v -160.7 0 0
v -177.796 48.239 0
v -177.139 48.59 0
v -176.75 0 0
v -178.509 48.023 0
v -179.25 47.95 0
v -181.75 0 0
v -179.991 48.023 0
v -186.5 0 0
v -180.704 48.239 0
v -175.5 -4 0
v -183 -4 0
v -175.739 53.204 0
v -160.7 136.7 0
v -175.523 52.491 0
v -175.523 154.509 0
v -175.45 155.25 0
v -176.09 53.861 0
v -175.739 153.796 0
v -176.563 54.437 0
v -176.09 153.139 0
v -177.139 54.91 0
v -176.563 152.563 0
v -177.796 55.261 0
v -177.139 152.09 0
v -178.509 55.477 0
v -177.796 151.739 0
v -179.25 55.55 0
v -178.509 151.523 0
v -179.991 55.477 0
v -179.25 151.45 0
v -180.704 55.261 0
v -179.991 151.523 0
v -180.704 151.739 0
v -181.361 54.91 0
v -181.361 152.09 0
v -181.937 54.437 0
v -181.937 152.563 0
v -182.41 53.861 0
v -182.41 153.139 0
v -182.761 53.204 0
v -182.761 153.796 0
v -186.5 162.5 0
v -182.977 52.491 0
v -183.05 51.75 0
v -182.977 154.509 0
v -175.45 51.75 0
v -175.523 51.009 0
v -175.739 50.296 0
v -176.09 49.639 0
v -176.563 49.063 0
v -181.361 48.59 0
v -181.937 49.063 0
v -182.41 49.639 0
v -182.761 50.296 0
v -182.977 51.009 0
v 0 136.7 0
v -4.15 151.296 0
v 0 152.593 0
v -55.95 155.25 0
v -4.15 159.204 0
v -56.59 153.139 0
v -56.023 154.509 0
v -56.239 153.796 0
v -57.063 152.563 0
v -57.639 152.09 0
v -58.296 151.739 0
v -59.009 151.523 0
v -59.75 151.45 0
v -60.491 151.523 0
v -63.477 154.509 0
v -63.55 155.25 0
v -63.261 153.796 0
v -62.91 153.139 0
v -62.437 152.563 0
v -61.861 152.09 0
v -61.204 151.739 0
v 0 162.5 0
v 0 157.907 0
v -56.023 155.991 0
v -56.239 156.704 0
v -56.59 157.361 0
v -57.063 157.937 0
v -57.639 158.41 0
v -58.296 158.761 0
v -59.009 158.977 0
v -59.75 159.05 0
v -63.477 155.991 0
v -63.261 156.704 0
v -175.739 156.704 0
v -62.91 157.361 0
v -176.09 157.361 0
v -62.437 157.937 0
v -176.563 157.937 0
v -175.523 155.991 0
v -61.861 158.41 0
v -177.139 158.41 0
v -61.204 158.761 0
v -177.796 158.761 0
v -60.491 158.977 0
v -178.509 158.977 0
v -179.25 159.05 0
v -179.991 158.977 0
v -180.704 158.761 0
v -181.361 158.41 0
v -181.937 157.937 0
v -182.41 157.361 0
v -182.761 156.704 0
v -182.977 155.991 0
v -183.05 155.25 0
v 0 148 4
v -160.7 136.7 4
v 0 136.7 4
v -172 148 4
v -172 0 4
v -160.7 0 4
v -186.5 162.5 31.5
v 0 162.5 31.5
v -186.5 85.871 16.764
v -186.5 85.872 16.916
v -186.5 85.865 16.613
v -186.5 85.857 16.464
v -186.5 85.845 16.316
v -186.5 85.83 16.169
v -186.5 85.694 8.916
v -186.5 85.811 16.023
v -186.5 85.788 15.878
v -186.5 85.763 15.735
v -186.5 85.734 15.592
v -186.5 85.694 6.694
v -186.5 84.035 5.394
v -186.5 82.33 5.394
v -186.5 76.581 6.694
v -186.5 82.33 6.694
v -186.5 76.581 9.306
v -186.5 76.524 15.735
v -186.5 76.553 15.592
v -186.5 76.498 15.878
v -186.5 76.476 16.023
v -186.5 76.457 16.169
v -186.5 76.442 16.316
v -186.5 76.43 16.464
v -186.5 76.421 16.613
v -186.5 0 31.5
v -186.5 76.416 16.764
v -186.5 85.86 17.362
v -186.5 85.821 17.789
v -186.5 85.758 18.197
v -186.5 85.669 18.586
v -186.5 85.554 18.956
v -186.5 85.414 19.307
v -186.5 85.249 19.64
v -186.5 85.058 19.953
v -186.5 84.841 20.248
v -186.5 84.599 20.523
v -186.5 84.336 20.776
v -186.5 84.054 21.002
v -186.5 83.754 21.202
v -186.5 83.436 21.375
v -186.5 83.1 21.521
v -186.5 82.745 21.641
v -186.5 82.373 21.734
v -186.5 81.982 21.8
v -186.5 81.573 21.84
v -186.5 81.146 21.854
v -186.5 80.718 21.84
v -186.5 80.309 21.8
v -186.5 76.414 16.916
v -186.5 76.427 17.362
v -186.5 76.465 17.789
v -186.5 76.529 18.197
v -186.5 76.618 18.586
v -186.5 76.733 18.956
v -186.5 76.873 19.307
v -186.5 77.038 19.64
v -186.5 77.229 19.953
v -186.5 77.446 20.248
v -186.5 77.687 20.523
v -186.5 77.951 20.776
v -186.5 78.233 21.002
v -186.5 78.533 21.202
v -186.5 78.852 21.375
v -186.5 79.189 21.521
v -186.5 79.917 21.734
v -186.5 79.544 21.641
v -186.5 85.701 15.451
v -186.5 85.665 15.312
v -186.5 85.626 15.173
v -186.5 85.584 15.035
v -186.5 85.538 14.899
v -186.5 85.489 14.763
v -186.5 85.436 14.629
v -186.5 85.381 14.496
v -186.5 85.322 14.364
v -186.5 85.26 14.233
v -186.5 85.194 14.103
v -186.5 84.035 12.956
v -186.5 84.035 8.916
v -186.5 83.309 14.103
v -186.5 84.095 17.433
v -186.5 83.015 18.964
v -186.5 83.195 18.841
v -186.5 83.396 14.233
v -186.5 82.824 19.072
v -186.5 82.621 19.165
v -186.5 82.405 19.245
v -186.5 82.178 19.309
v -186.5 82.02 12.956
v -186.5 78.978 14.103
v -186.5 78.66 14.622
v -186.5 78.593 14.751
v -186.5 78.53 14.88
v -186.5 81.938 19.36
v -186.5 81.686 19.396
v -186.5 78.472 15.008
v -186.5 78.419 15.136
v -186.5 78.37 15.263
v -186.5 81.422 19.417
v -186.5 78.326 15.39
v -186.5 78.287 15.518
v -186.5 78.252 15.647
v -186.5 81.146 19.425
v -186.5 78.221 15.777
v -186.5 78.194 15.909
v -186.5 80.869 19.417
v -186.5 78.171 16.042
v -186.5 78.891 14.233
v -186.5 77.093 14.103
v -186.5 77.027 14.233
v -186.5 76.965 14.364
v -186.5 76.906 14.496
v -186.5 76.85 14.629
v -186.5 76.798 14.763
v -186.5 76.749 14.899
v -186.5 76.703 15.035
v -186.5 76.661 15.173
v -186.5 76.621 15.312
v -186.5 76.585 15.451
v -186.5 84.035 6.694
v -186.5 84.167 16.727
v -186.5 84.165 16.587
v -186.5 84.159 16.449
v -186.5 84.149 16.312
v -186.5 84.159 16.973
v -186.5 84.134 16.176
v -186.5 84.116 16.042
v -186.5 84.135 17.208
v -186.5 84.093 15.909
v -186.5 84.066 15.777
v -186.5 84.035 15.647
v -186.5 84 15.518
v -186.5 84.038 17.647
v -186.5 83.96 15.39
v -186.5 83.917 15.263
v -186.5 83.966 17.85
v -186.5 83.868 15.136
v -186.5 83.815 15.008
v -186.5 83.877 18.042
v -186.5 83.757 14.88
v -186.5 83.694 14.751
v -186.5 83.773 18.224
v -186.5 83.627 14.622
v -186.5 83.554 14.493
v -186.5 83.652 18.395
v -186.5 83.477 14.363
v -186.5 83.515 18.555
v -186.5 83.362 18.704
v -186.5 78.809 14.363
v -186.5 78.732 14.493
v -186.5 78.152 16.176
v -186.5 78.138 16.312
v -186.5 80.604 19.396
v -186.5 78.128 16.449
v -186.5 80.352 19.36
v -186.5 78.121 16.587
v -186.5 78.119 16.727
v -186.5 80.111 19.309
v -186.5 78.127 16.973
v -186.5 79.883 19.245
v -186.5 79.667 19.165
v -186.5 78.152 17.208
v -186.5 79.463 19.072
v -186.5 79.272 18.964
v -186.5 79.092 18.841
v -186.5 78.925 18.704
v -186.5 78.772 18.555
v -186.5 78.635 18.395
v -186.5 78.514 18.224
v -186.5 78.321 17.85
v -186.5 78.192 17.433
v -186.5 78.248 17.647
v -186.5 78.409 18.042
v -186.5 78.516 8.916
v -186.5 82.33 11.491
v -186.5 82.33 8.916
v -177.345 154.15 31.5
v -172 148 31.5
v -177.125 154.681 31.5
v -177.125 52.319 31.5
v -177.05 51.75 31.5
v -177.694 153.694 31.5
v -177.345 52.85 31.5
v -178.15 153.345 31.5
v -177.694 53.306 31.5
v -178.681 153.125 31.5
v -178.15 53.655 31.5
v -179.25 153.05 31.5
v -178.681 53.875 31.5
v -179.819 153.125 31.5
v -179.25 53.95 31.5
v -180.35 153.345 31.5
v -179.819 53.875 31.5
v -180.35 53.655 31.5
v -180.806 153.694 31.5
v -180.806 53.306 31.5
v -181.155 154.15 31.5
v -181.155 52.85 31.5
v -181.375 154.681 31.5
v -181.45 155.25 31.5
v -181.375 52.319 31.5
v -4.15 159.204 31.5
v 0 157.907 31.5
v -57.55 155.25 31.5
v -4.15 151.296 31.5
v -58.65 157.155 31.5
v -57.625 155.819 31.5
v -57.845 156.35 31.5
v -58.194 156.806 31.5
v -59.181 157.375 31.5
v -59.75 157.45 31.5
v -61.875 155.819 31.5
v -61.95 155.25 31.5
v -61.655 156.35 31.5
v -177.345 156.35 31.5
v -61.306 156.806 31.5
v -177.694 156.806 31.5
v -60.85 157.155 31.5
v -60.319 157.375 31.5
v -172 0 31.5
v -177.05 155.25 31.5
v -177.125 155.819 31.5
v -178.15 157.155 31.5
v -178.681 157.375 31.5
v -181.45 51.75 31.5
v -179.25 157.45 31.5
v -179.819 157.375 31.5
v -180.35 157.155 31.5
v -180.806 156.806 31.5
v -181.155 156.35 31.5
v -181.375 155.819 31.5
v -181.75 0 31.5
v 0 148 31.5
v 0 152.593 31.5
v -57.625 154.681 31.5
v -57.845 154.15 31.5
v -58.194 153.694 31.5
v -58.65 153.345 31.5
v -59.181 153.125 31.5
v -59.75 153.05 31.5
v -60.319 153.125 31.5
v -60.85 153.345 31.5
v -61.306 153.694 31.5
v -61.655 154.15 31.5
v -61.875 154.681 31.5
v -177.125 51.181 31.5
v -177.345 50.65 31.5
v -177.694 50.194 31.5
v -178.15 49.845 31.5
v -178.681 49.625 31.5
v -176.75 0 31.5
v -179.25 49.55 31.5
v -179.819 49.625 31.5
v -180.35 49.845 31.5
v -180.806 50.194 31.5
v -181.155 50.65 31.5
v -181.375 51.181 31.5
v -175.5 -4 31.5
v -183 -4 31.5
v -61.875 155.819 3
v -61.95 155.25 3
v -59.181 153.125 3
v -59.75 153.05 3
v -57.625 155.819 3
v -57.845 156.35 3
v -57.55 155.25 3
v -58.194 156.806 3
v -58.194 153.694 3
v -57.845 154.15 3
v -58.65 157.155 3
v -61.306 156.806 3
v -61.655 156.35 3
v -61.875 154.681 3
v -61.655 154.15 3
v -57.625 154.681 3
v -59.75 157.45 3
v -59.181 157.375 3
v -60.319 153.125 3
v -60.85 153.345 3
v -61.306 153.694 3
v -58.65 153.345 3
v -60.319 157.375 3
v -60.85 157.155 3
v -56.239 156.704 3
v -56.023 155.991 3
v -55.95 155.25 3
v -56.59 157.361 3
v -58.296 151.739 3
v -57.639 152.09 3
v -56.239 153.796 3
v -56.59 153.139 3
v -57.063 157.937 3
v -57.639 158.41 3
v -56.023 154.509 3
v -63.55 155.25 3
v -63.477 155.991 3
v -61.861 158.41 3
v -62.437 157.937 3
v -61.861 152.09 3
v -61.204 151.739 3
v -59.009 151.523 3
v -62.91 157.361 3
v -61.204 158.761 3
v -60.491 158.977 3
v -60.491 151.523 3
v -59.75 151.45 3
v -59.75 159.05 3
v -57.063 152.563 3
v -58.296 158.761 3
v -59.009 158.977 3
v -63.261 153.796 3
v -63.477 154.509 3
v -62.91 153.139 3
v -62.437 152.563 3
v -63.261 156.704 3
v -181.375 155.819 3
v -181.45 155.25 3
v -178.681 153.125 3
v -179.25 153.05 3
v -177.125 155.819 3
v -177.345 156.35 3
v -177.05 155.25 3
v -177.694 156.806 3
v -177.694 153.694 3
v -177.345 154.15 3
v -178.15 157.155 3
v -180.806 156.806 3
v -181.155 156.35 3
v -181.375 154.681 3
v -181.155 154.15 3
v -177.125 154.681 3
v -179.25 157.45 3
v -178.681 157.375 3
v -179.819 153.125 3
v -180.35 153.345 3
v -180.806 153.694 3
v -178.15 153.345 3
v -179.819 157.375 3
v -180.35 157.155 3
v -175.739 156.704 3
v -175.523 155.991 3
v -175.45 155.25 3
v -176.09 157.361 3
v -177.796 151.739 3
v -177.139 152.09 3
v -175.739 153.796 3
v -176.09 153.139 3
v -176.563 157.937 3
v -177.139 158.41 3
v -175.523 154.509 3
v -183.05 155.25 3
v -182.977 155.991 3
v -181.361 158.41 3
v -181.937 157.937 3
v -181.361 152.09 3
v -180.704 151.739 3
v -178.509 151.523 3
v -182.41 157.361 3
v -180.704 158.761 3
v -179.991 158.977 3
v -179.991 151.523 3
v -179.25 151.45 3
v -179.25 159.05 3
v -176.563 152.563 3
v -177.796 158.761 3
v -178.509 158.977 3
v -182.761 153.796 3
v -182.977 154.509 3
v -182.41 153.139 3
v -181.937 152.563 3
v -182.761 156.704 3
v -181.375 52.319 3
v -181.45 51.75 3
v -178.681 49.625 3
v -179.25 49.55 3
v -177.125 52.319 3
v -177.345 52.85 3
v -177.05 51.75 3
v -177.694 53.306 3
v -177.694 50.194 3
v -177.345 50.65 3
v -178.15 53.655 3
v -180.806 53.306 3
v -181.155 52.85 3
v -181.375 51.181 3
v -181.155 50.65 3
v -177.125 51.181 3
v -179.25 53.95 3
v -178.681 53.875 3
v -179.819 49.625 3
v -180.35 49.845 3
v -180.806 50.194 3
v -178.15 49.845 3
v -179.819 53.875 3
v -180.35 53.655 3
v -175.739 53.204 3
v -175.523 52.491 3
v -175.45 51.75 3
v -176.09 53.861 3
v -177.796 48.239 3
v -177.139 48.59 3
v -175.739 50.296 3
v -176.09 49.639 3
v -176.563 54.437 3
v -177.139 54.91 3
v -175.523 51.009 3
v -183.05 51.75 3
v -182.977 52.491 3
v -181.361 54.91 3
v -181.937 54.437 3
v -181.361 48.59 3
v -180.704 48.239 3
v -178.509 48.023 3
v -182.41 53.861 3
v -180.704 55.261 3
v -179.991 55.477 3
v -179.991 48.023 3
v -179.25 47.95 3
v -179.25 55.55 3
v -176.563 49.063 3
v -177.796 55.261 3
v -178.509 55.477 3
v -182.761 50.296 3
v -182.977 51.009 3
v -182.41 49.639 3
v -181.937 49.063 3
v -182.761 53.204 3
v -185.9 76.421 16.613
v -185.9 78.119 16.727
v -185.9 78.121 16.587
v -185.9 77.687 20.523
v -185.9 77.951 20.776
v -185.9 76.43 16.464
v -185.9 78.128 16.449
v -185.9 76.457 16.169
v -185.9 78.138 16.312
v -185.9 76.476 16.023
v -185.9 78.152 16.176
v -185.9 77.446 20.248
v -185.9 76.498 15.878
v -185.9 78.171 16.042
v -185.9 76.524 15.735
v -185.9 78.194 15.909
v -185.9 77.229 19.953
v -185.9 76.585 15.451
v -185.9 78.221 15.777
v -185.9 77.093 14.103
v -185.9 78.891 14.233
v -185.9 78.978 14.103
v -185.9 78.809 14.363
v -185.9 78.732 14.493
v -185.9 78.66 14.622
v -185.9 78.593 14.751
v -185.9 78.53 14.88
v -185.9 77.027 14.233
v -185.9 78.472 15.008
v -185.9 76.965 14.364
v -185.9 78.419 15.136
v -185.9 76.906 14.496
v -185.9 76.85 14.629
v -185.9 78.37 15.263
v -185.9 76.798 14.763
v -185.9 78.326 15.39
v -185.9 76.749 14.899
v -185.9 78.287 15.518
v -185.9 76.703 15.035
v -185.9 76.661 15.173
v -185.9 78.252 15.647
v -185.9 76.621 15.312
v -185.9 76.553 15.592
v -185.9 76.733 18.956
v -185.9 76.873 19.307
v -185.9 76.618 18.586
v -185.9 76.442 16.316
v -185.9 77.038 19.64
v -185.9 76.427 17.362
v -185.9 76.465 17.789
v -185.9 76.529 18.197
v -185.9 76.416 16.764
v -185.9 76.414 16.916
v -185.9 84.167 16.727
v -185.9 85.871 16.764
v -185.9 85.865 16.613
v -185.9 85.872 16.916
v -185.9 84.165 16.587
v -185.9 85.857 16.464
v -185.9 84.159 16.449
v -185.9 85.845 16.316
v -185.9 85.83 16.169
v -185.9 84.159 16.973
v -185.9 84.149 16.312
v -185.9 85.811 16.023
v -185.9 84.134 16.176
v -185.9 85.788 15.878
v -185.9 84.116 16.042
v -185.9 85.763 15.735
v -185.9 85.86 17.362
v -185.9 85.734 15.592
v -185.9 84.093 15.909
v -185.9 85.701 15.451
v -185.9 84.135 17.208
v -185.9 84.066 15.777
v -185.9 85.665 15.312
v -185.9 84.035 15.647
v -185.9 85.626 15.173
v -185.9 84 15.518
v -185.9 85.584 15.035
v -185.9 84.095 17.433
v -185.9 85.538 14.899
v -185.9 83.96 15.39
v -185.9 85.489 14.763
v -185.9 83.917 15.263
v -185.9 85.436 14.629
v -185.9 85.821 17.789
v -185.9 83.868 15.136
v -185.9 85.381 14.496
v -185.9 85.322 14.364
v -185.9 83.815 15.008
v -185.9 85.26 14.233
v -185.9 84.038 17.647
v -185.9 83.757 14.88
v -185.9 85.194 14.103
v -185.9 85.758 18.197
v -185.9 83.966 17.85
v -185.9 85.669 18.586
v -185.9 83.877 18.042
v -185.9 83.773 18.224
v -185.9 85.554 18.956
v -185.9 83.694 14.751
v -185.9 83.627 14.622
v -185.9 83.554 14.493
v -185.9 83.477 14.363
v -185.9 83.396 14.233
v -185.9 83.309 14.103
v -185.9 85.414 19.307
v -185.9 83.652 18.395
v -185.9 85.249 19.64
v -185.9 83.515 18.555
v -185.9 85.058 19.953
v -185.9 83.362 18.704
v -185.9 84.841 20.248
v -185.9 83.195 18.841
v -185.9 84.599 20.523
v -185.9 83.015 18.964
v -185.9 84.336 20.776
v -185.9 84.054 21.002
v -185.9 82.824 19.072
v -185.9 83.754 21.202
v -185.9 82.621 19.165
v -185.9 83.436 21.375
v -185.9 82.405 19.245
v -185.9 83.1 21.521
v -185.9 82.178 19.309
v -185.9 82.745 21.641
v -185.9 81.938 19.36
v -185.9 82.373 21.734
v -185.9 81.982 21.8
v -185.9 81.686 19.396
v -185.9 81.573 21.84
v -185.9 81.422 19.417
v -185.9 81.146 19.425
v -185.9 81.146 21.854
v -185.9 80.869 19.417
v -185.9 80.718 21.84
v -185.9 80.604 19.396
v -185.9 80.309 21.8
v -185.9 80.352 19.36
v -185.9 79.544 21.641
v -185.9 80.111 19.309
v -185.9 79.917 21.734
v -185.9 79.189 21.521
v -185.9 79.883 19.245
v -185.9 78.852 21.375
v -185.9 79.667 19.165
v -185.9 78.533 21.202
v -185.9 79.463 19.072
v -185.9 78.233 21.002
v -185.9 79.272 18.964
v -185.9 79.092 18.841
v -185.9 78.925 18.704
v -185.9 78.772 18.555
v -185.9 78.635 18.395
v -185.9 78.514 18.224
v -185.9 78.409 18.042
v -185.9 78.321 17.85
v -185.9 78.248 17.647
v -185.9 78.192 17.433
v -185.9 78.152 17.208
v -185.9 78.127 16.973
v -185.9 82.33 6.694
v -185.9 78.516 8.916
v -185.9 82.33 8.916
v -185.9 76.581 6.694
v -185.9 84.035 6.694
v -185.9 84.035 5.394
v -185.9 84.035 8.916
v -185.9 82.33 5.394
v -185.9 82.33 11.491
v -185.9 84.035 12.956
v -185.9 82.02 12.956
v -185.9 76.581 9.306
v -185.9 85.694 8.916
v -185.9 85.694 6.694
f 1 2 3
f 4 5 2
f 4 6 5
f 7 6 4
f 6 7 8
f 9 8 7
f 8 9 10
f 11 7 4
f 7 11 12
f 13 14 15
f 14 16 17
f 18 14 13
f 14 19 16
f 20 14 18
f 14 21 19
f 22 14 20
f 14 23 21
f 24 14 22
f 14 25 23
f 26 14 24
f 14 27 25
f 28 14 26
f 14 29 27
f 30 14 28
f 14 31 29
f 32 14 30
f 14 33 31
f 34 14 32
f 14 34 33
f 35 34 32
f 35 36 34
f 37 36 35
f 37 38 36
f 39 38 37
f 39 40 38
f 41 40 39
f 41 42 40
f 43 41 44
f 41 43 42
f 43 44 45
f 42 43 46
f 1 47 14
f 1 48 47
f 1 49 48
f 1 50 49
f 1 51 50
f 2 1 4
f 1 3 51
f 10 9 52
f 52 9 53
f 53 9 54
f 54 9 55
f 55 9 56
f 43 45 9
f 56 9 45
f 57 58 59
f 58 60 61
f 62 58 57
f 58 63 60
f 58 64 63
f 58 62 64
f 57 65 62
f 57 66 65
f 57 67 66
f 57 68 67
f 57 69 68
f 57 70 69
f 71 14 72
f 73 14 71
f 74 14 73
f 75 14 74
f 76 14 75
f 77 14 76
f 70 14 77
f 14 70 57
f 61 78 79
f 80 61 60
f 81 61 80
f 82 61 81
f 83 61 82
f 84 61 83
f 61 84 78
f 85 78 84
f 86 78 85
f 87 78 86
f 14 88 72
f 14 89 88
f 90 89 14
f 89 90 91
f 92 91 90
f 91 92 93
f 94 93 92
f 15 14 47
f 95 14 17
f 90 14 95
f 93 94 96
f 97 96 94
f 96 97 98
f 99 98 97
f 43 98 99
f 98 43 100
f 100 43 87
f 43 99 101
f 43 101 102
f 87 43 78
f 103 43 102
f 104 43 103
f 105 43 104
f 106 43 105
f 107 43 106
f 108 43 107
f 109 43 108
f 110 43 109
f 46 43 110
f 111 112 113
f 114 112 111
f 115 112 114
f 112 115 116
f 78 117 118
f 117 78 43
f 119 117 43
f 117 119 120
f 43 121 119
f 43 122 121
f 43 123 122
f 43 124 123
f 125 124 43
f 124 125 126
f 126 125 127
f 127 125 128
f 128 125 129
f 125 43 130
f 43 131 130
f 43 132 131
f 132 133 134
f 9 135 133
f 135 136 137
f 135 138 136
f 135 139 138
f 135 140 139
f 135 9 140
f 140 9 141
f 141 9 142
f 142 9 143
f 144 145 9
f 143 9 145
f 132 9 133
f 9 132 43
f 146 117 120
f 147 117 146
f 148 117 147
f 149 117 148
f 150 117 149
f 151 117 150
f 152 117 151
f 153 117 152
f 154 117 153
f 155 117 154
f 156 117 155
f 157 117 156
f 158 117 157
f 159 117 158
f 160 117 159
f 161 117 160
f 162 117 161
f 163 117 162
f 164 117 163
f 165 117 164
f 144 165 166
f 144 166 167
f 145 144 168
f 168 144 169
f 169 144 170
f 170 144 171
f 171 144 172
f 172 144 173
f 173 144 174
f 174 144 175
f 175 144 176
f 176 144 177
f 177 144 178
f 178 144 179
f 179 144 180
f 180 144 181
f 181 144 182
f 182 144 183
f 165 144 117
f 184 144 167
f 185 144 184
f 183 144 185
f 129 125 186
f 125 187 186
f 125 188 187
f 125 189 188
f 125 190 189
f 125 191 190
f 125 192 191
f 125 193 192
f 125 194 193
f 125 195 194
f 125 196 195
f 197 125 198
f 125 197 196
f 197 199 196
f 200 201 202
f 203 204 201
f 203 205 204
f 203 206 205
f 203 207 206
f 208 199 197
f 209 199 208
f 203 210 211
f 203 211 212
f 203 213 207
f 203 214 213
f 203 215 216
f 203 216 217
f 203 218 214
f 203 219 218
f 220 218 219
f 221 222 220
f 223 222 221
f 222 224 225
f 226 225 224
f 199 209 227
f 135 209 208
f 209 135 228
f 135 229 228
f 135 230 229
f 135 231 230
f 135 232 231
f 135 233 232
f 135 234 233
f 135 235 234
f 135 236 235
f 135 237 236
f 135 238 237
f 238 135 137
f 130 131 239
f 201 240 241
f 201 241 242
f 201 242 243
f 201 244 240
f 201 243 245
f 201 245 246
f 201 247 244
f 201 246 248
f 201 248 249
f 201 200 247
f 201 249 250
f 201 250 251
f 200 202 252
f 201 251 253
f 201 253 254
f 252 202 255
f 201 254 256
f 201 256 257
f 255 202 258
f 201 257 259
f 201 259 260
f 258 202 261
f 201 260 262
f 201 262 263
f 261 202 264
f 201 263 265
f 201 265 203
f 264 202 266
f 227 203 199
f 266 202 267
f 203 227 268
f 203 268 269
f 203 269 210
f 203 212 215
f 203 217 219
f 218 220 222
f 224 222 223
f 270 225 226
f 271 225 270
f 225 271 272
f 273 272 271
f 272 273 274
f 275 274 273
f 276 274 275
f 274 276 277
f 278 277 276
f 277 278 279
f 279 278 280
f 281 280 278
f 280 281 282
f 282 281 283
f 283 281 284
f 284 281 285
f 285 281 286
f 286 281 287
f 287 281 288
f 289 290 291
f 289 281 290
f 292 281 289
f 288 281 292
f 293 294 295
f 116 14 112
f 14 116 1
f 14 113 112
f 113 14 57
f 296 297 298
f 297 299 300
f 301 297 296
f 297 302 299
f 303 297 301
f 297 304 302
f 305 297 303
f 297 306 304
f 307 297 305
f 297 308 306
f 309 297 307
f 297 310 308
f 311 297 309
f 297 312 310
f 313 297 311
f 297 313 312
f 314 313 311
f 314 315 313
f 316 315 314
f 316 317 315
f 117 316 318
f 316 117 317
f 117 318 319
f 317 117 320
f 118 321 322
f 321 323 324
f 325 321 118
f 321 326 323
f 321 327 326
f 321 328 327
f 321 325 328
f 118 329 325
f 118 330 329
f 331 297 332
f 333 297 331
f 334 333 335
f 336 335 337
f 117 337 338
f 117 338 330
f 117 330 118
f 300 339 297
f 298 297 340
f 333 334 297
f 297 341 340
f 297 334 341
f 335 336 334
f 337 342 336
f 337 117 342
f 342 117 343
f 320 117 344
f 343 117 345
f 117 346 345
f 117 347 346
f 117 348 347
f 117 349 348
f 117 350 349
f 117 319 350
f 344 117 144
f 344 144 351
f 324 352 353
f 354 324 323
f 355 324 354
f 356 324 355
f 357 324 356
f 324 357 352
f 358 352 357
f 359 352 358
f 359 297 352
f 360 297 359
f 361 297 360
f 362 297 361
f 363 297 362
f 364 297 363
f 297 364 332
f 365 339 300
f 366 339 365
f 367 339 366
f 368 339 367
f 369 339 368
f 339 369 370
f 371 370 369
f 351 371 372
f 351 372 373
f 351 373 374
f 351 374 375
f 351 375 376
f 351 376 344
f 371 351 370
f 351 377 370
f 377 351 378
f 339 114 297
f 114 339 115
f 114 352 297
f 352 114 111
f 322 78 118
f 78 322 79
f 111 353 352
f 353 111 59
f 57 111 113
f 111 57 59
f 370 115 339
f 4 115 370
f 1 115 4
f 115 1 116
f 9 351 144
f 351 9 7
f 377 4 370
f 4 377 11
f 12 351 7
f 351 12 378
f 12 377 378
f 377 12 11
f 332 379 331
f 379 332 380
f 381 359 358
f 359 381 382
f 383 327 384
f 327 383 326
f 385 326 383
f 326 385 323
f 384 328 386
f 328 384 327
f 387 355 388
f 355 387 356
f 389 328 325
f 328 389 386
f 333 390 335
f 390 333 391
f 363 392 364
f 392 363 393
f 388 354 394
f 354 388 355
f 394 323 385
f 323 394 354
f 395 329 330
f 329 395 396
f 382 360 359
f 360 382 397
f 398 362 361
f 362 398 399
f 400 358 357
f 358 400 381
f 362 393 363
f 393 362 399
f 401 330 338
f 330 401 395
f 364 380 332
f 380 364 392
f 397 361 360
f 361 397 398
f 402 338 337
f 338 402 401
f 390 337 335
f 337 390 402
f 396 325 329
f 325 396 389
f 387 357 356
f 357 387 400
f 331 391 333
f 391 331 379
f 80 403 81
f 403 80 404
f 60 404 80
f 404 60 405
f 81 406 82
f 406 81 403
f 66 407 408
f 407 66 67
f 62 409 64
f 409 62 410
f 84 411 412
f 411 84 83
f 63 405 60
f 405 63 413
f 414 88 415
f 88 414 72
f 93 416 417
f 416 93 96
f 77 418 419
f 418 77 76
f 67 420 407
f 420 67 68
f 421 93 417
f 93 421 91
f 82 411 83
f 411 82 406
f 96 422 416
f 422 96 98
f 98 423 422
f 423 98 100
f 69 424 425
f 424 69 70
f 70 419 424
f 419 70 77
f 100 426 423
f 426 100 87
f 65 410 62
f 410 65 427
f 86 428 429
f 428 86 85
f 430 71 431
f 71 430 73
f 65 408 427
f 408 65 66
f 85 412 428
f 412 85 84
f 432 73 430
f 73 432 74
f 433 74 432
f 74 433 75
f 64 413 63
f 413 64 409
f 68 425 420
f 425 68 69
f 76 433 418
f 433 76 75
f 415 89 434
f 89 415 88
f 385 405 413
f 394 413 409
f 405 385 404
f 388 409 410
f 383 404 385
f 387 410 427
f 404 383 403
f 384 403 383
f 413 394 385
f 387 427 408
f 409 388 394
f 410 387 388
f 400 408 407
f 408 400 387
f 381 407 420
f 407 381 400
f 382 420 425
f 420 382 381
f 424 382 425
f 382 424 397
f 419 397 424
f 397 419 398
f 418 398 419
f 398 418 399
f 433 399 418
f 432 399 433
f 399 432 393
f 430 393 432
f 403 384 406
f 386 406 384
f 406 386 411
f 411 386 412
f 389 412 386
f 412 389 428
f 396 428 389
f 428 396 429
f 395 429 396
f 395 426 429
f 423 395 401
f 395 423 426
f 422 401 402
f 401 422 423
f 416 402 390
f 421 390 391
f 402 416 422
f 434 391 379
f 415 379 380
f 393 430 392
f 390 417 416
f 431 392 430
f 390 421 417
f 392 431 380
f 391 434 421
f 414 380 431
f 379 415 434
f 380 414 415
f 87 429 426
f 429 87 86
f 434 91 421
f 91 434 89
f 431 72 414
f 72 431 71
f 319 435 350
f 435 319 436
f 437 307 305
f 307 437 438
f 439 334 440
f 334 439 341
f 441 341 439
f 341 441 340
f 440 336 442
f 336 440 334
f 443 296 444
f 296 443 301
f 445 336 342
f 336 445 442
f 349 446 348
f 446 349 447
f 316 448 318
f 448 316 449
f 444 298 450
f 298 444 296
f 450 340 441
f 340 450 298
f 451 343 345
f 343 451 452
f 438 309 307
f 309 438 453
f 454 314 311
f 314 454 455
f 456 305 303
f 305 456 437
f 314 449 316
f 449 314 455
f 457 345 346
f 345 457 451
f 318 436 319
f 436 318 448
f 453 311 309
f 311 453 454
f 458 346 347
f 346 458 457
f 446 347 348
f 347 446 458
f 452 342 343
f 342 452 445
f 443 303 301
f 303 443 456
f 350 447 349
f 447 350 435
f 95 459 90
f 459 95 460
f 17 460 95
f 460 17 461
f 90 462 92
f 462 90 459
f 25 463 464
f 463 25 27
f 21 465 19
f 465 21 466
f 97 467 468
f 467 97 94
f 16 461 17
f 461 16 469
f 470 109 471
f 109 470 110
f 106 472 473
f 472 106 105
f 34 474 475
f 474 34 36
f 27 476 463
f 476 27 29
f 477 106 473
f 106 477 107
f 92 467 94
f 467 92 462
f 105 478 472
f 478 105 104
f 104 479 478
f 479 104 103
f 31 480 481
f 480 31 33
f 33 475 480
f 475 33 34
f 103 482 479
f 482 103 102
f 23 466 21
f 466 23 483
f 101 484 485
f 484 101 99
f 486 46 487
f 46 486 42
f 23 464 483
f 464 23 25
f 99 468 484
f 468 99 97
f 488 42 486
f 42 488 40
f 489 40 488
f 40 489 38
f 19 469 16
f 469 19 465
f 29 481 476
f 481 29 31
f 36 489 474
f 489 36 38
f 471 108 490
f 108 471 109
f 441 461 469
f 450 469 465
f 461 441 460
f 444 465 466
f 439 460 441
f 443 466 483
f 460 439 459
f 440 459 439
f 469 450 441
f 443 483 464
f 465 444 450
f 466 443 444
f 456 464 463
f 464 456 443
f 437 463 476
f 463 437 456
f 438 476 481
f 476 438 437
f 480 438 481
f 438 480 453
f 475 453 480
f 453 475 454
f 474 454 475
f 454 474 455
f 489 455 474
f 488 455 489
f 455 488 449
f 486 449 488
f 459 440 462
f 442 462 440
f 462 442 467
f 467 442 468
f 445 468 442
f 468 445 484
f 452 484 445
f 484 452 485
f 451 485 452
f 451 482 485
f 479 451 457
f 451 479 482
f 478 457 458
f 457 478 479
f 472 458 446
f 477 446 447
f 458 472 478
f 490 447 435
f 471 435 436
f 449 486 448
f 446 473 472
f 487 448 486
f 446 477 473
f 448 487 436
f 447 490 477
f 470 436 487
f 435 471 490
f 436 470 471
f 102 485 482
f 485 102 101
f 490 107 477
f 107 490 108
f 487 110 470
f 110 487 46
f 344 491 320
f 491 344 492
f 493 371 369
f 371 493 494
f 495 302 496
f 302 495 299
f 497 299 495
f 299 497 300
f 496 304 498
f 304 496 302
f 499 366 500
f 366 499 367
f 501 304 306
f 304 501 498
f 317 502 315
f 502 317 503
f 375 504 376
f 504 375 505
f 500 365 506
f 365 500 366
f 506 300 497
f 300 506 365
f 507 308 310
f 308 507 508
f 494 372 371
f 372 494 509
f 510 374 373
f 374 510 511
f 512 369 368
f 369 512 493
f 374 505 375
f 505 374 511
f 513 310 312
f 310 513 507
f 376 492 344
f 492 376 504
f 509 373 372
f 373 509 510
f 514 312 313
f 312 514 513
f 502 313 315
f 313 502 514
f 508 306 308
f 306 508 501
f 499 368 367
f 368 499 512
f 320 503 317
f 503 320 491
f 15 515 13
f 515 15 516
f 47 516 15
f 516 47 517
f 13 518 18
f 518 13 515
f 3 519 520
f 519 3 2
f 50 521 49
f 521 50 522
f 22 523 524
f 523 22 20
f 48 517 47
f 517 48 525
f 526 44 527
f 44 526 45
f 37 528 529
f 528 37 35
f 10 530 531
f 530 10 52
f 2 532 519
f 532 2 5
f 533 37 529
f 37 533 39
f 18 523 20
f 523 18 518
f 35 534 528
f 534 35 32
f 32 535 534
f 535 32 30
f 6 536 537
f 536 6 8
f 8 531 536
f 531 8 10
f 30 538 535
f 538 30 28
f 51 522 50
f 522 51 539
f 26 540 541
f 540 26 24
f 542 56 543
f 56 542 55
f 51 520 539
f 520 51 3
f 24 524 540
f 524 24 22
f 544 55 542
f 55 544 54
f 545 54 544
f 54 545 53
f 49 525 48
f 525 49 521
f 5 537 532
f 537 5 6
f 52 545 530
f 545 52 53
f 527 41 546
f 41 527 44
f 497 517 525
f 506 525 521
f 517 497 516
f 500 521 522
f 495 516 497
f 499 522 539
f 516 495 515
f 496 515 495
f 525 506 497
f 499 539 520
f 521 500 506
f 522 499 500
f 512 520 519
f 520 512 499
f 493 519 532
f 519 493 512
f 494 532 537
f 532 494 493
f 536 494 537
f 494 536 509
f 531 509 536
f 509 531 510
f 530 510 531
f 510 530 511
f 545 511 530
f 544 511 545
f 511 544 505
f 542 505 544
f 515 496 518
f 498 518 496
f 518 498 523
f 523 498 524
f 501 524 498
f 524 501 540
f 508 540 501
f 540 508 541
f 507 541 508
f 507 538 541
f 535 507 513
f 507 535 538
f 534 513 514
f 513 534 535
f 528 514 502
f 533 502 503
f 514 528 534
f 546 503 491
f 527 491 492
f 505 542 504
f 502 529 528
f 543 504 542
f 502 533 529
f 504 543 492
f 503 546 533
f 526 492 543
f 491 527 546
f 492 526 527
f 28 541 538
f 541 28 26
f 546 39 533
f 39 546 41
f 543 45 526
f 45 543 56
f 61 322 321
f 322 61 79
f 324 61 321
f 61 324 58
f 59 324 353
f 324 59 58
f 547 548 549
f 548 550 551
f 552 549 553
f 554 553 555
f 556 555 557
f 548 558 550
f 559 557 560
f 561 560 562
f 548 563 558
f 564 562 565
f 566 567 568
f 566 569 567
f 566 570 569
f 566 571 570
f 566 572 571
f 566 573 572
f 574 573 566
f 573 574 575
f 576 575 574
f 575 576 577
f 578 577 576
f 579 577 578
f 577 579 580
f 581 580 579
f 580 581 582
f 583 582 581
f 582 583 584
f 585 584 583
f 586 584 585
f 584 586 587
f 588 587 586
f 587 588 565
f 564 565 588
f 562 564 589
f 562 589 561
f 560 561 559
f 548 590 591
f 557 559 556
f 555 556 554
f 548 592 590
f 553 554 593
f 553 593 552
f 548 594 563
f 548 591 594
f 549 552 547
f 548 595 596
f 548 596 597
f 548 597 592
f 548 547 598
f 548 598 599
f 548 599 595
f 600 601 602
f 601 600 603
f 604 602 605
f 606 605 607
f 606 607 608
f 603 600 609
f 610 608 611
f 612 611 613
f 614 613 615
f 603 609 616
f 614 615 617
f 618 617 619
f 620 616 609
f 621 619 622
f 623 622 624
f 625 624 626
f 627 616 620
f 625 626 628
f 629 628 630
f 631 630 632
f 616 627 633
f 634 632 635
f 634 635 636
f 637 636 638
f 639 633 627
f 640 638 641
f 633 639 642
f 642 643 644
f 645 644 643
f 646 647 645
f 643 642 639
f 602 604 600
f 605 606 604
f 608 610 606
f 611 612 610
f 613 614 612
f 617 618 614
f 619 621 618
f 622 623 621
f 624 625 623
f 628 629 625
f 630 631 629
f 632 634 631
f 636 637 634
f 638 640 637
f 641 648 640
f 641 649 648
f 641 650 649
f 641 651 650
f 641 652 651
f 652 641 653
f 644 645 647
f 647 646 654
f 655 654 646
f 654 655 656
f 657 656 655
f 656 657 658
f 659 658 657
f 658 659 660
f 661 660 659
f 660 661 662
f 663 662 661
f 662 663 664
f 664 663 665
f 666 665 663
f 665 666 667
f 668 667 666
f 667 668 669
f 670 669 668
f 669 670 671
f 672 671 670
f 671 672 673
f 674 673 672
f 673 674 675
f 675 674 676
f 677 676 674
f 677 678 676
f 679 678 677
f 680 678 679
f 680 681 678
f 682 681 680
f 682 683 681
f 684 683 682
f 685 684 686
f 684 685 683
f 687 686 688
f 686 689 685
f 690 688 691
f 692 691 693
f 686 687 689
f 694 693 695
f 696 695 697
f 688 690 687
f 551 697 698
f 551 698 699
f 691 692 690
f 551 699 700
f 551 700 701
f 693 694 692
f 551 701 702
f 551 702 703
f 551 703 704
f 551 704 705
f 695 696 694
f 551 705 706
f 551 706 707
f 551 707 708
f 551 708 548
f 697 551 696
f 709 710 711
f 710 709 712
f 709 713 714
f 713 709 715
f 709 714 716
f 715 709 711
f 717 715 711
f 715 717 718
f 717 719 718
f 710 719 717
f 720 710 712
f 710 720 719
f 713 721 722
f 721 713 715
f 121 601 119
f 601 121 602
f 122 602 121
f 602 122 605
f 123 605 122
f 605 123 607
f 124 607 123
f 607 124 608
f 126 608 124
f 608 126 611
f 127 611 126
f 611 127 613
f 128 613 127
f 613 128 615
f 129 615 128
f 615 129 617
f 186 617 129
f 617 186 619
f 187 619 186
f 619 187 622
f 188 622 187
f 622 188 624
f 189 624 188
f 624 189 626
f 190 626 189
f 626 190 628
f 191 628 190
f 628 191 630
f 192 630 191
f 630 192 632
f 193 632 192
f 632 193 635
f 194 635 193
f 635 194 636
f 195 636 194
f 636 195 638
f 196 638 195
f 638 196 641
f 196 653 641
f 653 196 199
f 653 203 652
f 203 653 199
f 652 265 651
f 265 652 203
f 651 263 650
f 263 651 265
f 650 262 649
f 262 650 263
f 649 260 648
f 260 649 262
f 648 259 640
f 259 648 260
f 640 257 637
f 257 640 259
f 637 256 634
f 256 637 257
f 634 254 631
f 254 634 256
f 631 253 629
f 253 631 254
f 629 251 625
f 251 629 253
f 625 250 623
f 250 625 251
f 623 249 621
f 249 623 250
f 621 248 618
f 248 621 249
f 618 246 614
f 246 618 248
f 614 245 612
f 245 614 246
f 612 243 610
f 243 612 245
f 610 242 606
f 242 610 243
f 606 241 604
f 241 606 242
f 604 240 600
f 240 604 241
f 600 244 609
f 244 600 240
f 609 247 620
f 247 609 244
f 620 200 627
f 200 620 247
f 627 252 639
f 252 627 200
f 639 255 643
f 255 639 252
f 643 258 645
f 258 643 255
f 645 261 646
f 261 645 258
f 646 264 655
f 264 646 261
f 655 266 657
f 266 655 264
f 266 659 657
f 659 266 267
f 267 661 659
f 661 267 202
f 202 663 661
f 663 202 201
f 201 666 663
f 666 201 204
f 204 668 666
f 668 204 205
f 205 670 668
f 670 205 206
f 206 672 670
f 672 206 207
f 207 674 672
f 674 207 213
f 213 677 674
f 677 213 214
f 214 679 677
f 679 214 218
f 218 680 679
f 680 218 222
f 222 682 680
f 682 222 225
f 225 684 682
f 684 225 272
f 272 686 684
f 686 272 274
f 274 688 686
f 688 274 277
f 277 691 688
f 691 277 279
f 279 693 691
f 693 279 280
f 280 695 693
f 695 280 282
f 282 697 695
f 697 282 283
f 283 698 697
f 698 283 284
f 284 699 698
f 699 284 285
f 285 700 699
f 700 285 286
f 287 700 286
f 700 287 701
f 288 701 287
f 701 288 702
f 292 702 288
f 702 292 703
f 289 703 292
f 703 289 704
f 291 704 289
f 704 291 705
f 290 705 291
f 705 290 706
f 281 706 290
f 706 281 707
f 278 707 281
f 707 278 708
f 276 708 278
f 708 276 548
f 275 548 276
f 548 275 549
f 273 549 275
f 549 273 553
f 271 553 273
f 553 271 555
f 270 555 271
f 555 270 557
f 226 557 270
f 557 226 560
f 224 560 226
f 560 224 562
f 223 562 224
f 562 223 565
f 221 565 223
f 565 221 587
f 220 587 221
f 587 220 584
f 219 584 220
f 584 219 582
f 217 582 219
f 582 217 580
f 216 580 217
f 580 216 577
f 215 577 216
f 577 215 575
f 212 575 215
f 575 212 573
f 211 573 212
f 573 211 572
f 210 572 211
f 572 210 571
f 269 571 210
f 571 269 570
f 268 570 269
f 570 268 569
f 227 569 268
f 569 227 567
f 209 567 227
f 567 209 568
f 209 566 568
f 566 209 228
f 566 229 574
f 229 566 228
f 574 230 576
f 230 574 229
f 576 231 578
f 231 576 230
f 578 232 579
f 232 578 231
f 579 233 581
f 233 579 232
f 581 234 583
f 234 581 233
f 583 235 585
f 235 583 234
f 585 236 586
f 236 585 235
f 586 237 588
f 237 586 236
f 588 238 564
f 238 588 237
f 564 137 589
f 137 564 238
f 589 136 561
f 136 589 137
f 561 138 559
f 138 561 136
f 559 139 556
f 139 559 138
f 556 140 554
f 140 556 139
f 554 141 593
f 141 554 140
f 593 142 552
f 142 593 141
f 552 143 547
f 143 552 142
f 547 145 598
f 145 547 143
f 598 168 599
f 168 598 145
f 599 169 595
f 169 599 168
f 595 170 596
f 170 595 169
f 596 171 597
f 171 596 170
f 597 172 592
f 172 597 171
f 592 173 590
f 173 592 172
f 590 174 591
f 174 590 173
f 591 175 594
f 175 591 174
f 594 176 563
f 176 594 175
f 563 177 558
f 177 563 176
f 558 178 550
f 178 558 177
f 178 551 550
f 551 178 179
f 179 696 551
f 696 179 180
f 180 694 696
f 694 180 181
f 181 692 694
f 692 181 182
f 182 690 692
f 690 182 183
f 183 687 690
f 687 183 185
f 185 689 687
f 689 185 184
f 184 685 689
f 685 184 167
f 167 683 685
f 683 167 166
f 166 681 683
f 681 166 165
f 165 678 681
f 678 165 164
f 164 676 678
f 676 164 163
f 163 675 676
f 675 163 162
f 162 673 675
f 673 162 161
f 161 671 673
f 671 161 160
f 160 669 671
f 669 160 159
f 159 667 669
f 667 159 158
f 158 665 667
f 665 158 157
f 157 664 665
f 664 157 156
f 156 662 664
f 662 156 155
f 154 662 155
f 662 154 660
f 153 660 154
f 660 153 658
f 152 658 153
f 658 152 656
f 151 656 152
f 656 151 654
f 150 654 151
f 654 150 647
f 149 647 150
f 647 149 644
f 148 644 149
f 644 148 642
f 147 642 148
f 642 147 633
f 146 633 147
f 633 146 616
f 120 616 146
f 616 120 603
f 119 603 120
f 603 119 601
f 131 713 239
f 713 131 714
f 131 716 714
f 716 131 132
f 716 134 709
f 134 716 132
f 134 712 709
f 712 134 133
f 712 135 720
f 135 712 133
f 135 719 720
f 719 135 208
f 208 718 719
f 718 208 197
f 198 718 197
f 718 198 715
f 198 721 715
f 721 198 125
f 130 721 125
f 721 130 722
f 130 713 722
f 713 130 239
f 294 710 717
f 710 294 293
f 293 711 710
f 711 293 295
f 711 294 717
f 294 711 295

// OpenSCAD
// P12 — Clamp quarter C4 (bottom-left). Front face on the bed. PLA, 4 walls, 3 mm brim.
// Needs lfh_v1_reference.scad in the same folder.
include <lfh_v1_reference.scad>
part = "C4";
pose = "print";
